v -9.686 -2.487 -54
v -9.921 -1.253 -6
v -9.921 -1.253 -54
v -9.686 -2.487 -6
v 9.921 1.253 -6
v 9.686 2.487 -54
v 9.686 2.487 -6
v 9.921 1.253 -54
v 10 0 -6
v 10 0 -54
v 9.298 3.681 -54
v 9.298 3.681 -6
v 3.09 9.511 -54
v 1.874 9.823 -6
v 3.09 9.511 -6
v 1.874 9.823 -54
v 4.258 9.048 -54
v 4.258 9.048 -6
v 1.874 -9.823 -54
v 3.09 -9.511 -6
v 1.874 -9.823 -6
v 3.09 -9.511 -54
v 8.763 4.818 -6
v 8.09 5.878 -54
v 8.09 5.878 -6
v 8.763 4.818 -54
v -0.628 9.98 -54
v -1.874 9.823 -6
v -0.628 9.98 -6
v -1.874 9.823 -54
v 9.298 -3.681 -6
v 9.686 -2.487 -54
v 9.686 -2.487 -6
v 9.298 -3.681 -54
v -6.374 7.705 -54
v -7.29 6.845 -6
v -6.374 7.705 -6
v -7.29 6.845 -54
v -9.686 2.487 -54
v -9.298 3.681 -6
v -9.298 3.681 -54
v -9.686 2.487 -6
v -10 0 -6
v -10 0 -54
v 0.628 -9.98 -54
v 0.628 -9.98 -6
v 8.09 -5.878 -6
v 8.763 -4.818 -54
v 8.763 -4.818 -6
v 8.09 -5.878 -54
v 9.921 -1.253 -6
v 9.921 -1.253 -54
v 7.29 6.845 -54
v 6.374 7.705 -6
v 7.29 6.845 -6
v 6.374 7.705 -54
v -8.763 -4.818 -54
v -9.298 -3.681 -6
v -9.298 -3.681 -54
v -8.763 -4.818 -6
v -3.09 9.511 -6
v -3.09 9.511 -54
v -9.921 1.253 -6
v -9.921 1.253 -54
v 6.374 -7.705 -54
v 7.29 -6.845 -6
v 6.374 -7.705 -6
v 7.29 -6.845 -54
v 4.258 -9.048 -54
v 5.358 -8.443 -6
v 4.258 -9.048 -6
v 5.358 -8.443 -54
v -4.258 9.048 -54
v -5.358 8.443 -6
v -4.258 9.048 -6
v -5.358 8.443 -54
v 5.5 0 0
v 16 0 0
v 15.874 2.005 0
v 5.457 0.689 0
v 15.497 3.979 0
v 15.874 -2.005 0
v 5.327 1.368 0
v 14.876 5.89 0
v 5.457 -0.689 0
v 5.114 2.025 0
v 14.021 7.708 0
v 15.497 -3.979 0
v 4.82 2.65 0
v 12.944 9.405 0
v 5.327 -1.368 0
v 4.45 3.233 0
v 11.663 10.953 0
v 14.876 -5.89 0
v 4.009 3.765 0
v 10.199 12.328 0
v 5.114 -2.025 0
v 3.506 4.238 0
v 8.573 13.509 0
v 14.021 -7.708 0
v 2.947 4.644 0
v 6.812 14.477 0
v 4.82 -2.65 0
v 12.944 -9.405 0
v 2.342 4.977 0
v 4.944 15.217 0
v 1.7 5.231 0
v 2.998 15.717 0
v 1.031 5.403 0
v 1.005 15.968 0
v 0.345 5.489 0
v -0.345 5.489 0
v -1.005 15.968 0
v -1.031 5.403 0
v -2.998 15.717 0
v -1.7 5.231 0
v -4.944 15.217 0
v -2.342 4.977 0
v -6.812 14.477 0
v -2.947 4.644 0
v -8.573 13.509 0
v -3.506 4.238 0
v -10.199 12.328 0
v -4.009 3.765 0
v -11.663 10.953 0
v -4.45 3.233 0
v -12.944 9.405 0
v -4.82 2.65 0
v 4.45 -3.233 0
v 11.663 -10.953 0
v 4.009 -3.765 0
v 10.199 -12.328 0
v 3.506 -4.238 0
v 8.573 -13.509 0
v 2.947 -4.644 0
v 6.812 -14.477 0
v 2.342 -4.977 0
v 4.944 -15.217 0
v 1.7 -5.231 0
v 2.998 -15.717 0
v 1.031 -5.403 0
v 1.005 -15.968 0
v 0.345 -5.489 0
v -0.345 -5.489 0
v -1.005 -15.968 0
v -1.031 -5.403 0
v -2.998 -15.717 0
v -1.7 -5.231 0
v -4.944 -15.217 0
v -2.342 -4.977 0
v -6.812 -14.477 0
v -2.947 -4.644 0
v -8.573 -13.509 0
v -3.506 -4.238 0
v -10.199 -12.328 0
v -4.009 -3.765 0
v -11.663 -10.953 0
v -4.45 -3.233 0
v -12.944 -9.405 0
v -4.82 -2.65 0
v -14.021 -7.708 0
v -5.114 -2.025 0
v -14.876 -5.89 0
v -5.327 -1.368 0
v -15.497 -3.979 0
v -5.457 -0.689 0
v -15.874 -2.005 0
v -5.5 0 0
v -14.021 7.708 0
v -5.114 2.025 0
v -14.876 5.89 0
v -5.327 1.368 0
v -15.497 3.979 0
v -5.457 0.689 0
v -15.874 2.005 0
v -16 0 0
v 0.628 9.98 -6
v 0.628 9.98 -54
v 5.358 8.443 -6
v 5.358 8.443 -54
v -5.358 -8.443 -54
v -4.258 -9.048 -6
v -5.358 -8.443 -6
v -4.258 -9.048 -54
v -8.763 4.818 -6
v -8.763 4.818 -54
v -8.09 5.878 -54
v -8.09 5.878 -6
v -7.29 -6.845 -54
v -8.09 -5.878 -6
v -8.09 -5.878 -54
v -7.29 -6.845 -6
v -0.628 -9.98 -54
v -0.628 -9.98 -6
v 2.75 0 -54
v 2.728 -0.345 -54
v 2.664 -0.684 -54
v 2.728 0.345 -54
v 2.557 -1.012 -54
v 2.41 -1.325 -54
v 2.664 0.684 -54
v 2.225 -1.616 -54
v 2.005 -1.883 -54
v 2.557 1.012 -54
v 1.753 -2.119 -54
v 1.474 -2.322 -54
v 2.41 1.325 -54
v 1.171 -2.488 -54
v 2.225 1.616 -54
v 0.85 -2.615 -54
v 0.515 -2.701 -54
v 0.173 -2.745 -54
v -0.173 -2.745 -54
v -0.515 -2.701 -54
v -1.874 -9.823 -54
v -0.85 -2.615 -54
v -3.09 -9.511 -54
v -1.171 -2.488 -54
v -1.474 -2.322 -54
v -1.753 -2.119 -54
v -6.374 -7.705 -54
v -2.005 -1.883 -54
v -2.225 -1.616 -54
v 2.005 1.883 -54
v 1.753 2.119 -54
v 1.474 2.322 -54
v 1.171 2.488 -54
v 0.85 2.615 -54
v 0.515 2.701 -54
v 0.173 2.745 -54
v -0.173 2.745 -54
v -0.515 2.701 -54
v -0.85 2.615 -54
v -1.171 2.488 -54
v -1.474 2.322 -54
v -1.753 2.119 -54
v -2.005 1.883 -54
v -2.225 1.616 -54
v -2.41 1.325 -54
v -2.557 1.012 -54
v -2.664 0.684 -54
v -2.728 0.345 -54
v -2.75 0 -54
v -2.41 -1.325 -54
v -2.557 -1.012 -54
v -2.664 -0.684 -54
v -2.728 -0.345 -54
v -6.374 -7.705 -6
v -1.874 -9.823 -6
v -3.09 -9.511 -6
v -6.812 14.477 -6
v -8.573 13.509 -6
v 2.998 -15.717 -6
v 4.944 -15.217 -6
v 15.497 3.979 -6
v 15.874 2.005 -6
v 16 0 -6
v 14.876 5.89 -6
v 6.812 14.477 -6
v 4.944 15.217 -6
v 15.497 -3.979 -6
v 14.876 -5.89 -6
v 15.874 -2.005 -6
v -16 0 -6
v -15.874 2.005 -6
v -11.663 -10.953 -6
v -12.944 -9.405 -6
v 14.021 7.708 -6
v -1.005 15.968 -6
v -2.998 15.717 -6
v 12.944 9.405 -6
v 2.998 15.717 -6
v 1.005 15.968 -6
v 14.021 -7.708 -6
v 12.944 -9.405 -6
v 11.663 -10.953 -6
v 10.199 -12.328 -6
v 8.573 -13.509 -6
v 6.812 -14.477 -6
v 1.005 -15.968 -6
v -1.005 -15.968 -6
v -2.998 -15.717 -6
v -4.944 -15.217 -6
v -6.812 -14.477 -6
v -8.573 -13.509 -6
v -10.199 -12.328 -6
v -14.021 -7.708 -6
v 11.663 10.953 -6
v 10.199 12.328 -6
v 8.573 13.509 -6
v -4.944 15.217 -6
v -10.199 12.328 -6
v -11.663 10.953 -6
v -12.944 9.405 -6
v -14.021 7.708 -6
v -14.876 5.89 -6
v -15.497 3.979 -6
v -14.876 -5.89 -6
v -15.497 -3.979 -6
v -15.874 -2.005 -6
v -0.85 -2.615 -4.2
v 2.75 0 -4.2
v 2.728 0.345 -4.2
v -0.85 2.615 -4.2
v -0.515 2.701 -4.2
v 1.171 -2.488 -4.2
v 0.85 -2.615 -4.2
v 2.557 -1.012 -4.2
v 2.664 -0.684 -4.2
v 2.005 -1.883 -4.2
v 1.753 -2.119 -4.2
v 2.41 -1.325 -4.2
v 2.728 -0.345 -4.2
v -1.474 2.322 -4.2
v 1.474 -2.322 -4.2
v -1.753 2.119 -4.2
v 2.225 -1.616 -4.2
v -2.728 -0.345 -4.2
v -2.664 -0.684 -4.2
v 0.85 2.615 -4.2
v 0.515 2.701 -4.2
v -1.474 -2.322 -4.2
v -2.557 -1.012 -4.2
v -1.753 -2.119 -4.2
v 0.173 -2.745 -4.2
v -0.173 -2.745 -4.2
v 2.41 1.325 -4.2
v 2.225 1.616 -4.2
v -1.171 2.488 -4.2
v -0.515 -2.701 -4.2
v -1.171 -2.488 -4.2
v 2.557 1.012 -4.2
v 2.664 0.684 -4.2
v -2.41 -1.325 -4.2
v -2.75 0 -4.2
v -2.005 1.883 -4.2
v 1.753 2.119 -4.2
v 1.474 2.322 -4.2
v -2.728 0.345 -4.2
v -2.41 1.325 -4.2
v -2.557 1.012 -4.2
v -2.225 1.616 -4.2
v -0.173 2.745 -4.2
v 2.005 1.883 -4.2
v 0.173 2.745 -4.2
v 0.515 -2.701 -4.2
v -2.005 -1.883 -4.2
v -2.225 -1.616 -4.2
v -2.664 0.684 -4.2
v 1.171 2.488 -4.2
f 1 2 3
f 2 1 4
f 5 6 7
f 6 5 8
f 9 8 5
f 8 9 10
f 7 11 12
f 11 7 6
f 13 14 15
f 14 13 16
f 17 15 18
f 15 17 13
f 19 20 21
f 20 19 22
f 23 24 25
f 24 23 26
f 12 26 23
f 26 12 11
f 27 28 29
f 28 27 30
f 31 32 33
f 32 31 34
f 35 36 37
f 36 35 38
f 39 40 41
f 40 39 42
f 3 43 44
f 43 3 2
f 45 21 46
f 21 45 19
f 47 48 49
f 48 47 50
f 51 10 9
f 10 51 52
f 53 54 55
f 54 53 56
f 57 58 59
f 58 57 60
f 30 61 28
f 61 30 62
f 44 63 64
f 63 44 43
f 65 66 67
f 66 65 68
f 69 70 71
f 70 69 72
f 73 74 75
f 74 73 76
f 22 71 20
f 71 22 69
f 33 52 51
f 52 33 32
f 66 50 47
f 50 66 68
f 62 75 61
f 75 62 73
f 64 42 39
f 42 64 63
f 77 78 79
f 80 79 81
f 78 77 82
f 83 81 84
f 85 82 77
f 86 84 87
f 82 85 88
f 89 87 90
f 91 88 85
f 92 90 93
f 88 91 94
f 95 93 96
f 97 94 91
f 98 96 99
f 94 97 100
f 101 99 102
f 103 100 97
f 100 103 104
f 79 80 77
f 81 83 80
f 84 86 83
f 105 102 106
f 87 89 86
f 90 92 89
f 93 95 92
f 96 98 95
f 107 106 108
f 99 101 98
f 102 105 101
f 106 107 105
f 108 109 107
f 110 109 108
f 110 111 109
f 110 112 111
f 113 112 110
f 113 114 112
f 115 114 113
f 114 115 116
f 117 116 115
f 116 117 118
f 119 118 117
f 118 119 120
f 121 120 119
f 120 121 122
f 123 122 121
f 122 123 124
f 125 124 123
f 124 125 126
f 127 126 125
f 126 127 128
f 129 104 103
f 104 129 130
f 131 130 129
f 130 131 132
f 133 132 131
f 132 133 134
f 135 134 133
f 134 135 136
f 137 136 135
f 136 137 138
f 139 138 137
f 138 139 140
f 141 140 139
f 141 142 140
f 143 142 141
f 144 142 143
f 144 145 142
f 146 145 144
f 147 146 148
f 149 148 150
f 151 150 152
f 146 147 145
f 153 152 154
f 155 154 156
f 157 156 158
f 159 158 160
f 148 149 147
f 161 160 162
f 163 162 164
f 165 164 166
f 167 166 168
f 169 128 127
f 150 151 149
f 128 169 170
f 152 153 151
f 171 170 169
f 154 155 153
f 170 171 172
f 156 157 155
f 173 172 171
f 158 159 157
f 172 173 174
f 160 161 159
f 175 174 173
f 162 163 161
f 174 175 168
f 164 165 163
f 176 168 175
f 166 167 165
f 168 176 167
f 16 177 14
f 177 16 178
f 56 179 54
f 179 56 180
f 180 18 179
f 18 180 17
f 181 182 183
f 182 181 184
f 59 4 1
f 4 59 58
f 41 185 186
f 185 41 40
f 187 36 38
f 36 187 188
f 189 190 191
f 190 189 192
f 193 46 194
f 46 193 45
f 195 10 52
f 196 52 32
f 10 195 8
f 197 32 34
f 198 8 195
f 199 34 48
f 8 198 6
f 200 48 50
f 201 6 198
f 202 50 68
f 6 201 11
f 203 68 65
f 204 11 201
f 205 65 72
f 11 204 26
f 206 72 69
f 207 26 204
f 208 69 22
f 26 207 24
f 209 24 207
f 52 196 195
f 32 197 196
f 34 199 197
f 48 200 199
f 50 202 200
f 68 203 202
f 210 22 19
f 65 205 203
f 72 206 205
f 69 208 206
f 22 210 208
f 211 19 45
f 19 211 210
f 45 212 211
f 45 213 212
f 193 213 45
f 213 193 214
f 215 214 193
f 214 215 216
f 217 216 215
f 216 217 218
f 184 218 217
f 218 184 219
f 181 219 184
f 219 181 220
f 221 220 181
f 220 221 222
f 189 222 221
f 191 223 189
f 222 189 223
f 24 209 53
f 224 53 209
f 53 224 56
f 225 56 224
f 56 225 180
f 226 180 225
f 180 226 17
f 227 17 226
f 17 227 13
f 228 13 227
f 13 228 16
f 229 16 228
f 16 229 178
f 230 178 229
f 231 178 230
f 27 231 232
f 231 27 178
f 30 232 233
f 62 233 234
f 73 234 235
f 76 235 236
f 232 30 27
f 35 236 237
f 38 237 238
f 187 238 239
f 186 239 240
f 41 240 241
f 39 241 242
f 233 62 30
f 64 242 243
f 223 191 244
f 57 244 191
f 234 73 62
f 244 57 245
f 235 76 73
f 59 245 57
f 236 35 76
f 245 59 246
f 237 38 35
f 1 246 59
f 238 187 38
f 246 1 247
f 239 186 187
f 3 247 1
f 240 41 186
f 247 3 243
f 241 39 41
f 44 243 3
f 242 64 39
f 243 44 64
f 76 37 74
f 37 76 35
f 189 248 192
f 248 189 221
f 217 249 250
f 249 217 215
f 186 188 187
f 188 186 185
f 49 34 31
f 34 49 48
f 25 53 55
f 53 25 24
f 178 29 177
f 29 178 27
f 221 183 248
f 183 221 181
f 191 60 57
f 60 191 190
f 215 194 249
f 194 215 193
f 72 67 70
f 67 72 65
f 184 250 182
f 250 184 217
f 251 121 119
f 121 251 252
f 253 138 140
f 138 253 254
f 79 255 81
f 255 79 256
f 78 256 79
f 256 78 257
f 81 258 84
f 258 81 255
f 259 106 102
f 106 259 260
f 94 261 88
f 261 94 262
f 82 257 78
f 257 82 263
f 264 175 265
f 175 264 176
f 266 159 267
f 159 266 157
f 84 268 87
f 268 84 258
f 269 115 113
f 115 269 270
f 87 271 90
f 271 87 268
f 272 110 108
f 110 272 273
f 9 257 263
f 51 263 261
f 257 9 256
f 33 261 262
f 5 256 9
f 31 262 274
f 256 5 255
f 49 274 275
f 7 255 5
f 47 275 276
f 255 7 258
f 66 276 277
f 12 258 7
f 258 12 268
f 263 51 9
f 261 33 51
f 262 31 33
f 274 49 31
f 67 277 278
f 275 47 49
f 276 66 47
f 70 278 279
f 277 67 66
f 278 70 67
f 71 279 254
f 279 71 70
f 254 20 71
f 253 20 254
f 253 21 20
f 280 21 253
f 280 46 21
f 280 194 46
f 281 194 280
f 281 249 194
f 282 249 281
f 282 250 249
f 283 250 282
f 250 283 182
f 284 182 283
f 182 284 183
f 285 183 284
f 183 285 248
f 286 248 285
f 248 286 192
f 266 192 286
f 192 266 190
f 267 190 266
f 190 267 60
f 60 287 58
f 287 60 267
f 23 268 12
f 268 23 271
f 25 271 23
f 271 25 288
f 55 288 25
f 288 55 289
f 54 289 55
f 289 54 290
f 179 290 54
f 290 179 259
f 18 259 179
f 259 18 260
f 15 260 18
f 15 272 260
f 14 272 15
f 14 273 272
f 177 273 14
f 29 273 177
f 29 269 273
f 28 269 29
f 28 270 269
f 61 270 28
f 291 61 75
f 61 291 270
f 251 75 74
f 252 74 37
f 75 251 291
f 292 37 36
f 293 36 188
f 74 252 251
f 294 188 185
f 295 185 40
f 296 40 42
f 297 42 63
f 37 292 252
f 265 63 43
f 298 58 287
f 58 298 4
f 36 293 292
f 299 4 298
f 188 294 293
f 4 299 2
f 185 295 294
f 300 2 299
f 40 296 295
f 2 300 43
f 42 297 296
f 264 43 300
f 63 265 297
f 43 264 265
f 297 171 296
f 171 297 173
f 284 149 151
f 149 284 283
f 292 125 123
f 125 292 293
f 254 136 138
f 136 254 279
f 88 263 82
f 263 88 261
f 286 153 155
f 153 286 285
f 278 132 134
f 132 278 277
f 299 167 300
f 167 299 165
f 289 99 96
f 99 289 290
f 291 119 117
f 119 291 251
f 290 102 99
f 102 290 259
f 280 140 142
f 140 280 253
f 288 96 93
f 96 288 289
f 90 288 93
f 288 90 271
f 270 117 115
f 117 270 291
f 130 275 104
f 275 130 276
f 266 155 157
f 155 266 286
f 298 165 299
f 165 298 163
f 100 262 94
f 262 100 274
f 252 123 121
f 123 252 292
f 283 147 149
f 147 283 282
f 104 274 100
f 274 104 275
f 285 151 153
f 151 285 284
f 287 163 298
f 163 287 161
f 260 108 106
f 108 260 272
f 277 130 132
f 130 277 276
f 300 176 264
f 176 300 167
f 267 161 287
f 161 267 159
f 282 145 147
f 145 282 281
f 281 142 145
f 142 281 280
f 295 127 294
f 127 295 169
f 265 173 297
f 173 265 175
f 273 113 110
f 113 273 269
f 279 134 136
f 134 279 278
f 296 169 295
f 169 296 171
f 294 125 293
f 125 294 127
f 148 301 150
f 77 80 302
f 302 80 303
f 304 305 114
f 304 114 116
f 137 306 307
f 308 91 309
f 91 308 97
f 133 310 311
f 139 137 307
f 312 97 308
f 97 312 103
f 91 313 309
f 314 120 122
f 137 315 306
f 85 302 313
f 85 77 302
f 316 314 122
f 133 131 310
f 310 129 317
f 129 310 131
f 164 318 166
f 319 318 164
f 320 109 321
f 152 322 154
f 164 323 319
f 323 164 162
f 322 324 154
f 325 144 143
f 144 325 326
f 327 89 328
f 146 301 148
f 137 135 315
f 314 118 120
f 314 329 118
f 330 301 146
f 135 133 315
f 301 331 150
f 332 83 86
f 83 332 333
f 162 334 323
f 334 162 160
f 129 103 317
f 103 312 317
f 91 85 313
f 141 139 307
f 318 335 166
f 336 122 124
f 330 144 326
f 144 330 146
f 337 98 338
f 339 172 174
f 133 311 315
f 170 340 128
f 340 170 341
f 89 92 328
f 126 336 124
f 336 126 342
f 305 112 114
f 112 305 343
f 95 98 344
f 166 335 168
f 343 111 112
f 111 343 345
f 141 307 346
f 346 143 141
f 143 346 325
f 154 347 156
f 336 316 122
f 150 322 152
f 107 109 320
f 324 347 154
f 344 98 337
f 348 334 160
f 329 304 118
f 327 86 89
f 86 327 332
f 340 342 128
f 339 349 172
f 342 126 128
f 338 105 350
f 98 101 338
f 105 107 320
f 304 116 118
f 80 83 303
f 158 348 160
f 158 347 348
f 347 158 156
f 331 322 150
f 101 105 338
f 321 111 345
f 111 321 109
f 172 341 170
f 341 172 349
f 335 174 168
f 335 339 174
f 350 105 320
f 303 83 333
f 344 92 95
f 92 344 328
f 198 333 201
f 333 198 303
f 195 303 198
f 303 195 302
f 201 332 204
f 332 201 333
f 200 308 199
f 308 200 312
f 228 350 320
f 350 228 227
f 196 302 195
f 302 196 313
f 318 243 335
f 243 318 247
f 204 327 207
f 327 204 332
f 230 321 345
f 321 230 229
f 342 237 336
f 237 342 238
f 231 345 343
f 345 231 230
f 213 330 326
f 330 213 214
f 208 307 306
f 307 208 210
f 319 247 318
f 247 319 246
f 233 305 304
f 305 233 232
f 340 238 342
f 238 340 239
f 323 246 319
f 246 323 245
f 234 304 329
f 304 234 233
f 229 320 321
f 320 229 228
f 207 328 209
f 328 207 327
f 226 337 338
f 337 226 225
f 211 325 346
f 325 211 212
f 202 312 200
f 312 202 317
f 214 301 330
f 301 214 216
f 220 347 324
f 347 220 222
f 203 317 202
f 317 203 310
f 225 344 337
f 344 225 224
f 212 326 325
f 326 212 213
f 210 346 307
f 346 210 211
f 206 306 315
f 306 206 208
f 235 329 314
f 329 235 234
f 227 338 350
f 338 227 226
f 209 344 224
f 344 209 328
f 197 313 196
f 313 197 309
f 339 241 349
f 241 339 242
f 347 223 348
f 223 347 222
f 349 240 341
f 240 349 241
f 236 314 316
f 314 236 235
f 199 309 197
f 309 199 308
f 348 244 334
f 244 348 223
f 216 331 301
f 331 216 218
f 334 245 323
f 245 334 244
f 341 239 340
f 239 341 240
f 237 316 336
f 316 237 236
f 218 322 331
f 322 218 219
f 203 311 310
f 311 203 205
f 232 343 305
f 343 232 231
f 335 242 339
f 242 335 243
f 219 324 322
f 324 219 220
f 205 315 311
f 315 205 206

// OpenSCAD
$fn = 50;


difference() {
	union() {
		translate(v = [0, 0, -54.0000000000]) {
			cylinder(h = 54, r = 10.0000000000);
		}
		translate(v = [0, 0, -6.0000000000]) {
			cylinder(h = 6, r = 16.0000000000);
		}
	}
	union() {
		translate(v = [0, 0, 0]) {
			rotate(a = [0, 0, 0]) {
				difference() {
					union() {
						#translate(v = [0, 0, -54.0000000000]) {
							cylinder(h = 54, r = 2.2500000000);
						}
						#translate(v = [0, 0, -4.2000000000]) {
							cylinder(h = 4.2000000000, r = 10.0000000000, r1 = 2.7500000000, r2 = 5.5000000000);
						}
						#translate(v = [0, 0, -54.0000000000]) {
							cylinder(h = 54, r = 2.7500000000);
						}
						#translate(v = [0, 0, -54.0000000000]) {
							cylinder(h = 54, r = 2.2500000000);
						}
					}
					union();
				}
			}
		}
	}
}
